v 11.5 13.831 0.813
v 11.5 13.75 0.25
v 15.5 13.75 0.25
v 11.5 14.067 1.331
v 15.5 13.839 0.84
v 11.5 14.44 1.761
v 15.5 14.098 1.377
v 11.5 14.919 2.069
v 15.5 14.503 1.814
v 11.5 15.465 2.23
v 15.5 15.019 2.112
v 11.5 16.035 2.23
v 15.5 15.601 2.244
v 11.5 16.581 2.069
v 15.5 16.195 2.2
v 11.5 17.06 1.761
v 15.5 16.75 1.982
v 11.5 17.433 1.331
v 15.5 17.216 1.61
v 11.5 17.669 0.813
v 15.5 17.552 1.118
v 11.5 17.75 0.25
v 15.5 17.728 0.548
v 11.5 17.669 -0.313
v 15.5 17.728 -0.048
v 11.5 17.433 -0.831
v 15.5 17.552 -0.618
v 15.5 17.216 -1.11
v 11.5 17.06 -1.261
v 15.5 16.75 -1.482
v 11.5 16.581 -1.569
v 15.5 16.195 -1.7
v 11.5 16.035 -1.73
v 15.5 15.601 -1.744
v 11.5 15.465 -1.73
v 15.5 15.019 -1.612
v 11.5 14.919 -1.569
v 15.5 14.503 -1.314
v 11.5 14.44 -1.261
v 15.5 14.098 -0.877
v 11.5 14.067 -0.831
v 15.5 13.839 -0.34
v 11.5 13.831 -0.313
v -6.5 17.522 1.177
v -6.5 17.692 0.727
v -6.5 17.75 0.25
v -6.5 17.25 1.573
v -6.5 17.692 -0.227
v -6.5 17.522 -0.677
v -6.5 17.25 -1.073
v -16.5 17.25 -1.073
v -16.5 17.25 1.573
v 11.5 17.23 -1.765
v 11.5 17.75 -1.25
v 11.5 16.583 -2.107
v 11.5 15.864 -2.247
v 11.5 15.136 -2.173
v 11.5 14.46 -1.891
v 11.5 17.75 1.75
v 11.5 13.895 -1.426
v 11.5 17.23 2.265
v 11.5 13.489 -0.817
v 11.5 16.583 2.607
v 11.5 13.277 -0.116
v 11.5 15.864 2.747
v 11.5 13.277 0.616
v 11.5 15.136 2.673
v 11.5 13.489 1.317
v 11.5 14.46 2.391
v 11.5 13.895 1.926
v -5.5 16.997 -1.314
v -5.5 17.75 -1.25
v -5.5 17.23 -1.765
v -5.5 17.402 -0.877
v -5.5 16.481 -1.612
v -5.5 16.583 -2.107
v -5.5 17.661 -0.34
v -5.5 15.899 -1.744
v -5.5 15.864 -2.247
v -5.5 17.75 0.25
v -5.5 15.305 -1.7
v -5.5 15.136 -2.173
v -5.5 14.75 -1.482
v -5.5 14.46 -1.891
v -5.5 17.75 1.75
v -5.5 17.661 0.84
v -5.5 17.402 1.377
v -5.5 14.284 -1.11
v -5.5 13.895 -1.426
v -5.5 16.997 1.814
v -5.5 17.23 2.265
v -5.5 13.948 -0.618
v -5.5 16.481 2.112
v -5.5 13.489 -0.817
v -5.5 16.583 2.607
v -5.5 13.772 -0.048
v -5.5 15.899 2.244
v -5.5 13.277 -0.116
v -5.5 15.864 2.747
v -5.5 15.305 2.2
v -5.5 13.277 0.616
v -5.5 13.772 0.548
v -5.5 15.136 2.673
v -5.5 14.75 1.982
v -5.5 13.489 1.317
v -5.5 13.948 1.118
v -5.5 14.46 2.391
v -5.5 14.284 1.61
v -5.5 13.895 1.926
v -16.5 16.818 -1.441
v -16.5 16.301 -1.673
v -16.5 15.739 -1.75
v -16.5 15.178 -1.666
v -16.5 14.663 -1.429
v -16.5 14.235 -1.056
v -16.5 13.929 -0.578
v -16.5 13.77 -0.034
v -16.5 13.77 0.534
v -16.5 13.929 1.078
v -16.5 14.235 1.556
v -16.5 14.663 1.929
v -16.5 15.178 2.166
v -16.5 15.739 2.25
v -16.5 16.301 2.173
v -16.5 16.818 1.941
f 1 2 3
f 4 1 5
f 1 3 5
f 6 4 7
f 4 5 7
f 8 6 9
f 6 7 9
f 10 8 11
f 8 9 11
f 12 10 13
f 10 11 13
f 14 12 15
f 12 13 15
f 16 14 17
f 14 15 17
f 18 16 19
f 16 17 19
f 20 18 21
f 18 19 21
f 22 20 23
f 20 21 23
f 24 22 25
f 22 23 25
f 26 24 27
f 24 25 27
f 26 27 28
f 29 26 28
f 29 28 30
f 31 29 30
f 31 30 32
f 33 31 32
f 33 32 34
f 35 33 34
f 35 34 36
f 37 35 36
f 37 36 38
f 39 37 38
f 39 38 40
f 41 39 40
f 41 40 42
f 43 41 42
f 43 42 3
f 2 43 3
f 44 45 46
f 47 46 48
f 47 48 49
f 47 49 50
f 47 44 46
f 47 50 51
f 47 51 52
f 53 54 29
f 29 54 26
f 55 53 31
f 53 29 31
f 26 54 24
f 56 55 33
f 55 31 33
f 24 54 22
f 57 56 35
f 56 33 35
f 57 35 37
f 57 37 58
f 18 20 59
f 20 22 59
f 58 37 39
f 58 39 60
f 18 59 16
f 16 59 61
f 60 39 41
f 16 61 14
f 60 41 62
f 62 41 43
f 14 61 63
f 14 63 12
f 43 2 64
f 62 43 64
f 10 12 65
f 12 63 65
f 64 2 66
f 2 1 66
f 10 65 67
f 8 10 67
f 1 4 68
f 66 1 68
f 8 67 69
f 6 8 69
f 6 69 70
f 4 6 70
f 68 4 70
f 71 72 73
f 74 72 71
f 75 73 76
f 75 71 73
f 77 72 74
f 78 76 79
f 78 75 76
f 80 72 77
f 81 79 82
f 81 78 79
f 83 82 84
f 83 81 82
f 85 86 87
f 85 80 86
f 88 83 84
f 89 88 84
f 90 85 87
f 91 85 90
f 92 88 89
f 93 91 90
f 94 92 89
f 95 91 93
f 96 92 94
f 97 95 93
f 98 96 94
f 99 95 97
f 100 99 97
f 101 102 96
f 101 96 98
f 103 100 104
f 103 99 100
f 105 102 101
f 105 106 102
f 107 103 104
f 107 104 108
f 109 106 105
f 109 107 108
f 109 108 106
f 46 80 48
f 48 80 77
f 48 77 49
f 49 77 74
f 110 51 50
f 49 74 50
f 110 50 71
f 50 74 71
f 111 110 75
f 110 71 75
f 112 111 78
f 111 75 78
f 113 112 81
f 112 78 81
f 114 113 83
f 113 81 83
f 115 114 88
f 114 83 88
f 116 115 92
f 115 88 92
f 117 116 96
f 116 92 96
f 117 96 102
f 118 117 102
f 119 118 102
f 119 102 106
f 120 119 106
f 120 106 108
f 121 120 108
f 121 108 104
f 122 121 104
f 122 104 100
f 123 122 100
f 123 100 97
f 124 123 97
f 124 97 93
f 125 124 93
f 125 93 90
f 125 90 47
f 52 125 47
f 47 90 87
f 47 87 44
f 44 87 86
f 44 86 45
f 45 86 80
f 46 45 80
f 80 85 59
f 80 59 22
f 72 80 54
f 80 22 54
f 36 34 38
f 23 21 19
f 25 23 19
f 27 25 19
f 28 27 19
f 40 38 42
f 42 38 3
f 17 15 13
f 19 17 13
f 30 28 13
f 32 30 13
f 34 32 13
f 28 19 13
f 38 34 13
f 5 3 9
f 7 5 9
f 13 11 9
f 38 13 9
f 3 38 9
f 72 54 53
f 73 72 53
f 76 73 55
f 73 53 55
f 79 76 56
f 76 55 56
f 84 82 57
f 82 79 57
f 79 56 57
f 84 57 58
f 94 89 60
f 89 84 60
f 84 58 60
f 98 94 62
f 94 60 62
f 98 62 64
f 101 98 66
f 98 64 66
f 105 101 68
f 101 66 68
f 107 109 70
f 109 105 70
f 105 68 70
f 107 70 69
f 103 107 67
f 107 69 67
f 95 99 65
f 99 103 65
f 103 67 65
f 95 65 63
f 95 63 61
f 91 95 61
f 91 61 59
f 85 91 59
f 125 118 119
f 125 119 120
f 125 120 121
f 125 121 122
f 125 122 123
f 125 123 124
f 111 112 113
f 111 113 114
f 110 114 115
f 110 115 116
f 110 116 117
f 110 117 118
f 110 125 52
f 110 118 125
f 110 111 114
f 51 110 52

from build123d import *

# Parameters (mm, degrees)
SKETCH1_R             = 2
BOSS_EXTRUDE1_DEPTH   = 4
SKETCH2_R             = 2.5
BOSS_EXTRUDE2_DEPTH   = 17
CUT_EXTRUDE1_START    = -17
CUT_EXTRUDE1_DEPTH    = 17
SKETCH4_R             = 2
BOSS_EXTRUDE3_DEPTH   = 11
BODY_MOVE_COPY3_ANGLE = 90
BODY_MOVE_COPY5_ANGLE = 90
CUT_EXTRUDE2_START    = -10
CUT_EXTRUDE2_DEPTH    = 10


with BuildPart() as part:
    # Sketch1 → Boss-Extrude1 (new body)
    with BuildSketch(Plane(origin=(0, 0, 0), x_dir=(1, 0, 0), z_dir=(0, 1, 0))):
        with Locations(Location((0, 0, 0), (0, 0, 270))):
            Circle(SKETCH1_R)
    extrude(amount=BOSS_EXTRUDE1_DEPTH)

    # Sketch2 → Boss-Extrude2 (add)
    with BuildSketch(Plane(origin=(0, 4, 0), x_dir=(1, 0, 0), z_dir=(0, 1, 0))):
        with Locations(Location((0, 0, 0), (0, 0, 270))):
            Circle(SKETCH2_R)
    extrude(amount=BOSS_EXTRUDE2_DEPTH)

    # Sketch3 → Cut-Extrude1 (cut)
    with BuildSketch(Plane(origin=(0, 21, 0), x_dir=(1, 0, 0), z_dir=(0, 1, 0)).offset(CUT_EXTRUDE1_START)):
        with BuildLine():
            Line((1.5, 2), (-1.5, 2))
            ThreePointArc((-1.5, 2), (0, 2.5), (1.5, 2))
        make_face()
    extrude(amount=CUT_EXTRUDE1_DEPTH, mode=Mode.SUBTRACT)

    # Sketch4 → Boss-Extrude3 (add)
    with BuildSketch(Plane(origin=(0, 21, 0), x_dir=(1, 0, 0), z_dir=(0, 1, 0))):
        with Locations(Location((0, 0, 0), (0, 0, 90))):
            Circle(SKETCH4_R)
    extrude(amount=BOSS_EXTRUDE3_DEPTH)


with BuildPart() as part_1:
    # Body-Move/Copy3: moved
    add(part.part.rotate(Axis((0, 15.5, 0), (0, 0, 1)), BODY_MOVE_COPY3_ANGLE))


with BuildPart() as part_2:
    # Body-Move/Copy5: moved
    add(part_1.part.rotate(Axis((0, 15.5, 0.25), (1, 0, 0)), BODY_MOVE_COPY5_ANGLE))

    # Sketch5 → Cut-Extrude2 (cut)
    with BuildSketch(Plane.ZY.offset(16.5).offset(CUT_EXTRUDE2_START)):
        with BuildLine():
            Line((-1.072875656, 17.25), (1.572875656, 17.25))
            ThreePointArc((1.572875656, 17.25), (0.25, 17.75), (-1.072875656, 17.25))
        make_face()
    extrude(amount=CUT_EXTRUDE2_DEPTH, mode=Mode.SUBTRACT)


solid = part_2.part
